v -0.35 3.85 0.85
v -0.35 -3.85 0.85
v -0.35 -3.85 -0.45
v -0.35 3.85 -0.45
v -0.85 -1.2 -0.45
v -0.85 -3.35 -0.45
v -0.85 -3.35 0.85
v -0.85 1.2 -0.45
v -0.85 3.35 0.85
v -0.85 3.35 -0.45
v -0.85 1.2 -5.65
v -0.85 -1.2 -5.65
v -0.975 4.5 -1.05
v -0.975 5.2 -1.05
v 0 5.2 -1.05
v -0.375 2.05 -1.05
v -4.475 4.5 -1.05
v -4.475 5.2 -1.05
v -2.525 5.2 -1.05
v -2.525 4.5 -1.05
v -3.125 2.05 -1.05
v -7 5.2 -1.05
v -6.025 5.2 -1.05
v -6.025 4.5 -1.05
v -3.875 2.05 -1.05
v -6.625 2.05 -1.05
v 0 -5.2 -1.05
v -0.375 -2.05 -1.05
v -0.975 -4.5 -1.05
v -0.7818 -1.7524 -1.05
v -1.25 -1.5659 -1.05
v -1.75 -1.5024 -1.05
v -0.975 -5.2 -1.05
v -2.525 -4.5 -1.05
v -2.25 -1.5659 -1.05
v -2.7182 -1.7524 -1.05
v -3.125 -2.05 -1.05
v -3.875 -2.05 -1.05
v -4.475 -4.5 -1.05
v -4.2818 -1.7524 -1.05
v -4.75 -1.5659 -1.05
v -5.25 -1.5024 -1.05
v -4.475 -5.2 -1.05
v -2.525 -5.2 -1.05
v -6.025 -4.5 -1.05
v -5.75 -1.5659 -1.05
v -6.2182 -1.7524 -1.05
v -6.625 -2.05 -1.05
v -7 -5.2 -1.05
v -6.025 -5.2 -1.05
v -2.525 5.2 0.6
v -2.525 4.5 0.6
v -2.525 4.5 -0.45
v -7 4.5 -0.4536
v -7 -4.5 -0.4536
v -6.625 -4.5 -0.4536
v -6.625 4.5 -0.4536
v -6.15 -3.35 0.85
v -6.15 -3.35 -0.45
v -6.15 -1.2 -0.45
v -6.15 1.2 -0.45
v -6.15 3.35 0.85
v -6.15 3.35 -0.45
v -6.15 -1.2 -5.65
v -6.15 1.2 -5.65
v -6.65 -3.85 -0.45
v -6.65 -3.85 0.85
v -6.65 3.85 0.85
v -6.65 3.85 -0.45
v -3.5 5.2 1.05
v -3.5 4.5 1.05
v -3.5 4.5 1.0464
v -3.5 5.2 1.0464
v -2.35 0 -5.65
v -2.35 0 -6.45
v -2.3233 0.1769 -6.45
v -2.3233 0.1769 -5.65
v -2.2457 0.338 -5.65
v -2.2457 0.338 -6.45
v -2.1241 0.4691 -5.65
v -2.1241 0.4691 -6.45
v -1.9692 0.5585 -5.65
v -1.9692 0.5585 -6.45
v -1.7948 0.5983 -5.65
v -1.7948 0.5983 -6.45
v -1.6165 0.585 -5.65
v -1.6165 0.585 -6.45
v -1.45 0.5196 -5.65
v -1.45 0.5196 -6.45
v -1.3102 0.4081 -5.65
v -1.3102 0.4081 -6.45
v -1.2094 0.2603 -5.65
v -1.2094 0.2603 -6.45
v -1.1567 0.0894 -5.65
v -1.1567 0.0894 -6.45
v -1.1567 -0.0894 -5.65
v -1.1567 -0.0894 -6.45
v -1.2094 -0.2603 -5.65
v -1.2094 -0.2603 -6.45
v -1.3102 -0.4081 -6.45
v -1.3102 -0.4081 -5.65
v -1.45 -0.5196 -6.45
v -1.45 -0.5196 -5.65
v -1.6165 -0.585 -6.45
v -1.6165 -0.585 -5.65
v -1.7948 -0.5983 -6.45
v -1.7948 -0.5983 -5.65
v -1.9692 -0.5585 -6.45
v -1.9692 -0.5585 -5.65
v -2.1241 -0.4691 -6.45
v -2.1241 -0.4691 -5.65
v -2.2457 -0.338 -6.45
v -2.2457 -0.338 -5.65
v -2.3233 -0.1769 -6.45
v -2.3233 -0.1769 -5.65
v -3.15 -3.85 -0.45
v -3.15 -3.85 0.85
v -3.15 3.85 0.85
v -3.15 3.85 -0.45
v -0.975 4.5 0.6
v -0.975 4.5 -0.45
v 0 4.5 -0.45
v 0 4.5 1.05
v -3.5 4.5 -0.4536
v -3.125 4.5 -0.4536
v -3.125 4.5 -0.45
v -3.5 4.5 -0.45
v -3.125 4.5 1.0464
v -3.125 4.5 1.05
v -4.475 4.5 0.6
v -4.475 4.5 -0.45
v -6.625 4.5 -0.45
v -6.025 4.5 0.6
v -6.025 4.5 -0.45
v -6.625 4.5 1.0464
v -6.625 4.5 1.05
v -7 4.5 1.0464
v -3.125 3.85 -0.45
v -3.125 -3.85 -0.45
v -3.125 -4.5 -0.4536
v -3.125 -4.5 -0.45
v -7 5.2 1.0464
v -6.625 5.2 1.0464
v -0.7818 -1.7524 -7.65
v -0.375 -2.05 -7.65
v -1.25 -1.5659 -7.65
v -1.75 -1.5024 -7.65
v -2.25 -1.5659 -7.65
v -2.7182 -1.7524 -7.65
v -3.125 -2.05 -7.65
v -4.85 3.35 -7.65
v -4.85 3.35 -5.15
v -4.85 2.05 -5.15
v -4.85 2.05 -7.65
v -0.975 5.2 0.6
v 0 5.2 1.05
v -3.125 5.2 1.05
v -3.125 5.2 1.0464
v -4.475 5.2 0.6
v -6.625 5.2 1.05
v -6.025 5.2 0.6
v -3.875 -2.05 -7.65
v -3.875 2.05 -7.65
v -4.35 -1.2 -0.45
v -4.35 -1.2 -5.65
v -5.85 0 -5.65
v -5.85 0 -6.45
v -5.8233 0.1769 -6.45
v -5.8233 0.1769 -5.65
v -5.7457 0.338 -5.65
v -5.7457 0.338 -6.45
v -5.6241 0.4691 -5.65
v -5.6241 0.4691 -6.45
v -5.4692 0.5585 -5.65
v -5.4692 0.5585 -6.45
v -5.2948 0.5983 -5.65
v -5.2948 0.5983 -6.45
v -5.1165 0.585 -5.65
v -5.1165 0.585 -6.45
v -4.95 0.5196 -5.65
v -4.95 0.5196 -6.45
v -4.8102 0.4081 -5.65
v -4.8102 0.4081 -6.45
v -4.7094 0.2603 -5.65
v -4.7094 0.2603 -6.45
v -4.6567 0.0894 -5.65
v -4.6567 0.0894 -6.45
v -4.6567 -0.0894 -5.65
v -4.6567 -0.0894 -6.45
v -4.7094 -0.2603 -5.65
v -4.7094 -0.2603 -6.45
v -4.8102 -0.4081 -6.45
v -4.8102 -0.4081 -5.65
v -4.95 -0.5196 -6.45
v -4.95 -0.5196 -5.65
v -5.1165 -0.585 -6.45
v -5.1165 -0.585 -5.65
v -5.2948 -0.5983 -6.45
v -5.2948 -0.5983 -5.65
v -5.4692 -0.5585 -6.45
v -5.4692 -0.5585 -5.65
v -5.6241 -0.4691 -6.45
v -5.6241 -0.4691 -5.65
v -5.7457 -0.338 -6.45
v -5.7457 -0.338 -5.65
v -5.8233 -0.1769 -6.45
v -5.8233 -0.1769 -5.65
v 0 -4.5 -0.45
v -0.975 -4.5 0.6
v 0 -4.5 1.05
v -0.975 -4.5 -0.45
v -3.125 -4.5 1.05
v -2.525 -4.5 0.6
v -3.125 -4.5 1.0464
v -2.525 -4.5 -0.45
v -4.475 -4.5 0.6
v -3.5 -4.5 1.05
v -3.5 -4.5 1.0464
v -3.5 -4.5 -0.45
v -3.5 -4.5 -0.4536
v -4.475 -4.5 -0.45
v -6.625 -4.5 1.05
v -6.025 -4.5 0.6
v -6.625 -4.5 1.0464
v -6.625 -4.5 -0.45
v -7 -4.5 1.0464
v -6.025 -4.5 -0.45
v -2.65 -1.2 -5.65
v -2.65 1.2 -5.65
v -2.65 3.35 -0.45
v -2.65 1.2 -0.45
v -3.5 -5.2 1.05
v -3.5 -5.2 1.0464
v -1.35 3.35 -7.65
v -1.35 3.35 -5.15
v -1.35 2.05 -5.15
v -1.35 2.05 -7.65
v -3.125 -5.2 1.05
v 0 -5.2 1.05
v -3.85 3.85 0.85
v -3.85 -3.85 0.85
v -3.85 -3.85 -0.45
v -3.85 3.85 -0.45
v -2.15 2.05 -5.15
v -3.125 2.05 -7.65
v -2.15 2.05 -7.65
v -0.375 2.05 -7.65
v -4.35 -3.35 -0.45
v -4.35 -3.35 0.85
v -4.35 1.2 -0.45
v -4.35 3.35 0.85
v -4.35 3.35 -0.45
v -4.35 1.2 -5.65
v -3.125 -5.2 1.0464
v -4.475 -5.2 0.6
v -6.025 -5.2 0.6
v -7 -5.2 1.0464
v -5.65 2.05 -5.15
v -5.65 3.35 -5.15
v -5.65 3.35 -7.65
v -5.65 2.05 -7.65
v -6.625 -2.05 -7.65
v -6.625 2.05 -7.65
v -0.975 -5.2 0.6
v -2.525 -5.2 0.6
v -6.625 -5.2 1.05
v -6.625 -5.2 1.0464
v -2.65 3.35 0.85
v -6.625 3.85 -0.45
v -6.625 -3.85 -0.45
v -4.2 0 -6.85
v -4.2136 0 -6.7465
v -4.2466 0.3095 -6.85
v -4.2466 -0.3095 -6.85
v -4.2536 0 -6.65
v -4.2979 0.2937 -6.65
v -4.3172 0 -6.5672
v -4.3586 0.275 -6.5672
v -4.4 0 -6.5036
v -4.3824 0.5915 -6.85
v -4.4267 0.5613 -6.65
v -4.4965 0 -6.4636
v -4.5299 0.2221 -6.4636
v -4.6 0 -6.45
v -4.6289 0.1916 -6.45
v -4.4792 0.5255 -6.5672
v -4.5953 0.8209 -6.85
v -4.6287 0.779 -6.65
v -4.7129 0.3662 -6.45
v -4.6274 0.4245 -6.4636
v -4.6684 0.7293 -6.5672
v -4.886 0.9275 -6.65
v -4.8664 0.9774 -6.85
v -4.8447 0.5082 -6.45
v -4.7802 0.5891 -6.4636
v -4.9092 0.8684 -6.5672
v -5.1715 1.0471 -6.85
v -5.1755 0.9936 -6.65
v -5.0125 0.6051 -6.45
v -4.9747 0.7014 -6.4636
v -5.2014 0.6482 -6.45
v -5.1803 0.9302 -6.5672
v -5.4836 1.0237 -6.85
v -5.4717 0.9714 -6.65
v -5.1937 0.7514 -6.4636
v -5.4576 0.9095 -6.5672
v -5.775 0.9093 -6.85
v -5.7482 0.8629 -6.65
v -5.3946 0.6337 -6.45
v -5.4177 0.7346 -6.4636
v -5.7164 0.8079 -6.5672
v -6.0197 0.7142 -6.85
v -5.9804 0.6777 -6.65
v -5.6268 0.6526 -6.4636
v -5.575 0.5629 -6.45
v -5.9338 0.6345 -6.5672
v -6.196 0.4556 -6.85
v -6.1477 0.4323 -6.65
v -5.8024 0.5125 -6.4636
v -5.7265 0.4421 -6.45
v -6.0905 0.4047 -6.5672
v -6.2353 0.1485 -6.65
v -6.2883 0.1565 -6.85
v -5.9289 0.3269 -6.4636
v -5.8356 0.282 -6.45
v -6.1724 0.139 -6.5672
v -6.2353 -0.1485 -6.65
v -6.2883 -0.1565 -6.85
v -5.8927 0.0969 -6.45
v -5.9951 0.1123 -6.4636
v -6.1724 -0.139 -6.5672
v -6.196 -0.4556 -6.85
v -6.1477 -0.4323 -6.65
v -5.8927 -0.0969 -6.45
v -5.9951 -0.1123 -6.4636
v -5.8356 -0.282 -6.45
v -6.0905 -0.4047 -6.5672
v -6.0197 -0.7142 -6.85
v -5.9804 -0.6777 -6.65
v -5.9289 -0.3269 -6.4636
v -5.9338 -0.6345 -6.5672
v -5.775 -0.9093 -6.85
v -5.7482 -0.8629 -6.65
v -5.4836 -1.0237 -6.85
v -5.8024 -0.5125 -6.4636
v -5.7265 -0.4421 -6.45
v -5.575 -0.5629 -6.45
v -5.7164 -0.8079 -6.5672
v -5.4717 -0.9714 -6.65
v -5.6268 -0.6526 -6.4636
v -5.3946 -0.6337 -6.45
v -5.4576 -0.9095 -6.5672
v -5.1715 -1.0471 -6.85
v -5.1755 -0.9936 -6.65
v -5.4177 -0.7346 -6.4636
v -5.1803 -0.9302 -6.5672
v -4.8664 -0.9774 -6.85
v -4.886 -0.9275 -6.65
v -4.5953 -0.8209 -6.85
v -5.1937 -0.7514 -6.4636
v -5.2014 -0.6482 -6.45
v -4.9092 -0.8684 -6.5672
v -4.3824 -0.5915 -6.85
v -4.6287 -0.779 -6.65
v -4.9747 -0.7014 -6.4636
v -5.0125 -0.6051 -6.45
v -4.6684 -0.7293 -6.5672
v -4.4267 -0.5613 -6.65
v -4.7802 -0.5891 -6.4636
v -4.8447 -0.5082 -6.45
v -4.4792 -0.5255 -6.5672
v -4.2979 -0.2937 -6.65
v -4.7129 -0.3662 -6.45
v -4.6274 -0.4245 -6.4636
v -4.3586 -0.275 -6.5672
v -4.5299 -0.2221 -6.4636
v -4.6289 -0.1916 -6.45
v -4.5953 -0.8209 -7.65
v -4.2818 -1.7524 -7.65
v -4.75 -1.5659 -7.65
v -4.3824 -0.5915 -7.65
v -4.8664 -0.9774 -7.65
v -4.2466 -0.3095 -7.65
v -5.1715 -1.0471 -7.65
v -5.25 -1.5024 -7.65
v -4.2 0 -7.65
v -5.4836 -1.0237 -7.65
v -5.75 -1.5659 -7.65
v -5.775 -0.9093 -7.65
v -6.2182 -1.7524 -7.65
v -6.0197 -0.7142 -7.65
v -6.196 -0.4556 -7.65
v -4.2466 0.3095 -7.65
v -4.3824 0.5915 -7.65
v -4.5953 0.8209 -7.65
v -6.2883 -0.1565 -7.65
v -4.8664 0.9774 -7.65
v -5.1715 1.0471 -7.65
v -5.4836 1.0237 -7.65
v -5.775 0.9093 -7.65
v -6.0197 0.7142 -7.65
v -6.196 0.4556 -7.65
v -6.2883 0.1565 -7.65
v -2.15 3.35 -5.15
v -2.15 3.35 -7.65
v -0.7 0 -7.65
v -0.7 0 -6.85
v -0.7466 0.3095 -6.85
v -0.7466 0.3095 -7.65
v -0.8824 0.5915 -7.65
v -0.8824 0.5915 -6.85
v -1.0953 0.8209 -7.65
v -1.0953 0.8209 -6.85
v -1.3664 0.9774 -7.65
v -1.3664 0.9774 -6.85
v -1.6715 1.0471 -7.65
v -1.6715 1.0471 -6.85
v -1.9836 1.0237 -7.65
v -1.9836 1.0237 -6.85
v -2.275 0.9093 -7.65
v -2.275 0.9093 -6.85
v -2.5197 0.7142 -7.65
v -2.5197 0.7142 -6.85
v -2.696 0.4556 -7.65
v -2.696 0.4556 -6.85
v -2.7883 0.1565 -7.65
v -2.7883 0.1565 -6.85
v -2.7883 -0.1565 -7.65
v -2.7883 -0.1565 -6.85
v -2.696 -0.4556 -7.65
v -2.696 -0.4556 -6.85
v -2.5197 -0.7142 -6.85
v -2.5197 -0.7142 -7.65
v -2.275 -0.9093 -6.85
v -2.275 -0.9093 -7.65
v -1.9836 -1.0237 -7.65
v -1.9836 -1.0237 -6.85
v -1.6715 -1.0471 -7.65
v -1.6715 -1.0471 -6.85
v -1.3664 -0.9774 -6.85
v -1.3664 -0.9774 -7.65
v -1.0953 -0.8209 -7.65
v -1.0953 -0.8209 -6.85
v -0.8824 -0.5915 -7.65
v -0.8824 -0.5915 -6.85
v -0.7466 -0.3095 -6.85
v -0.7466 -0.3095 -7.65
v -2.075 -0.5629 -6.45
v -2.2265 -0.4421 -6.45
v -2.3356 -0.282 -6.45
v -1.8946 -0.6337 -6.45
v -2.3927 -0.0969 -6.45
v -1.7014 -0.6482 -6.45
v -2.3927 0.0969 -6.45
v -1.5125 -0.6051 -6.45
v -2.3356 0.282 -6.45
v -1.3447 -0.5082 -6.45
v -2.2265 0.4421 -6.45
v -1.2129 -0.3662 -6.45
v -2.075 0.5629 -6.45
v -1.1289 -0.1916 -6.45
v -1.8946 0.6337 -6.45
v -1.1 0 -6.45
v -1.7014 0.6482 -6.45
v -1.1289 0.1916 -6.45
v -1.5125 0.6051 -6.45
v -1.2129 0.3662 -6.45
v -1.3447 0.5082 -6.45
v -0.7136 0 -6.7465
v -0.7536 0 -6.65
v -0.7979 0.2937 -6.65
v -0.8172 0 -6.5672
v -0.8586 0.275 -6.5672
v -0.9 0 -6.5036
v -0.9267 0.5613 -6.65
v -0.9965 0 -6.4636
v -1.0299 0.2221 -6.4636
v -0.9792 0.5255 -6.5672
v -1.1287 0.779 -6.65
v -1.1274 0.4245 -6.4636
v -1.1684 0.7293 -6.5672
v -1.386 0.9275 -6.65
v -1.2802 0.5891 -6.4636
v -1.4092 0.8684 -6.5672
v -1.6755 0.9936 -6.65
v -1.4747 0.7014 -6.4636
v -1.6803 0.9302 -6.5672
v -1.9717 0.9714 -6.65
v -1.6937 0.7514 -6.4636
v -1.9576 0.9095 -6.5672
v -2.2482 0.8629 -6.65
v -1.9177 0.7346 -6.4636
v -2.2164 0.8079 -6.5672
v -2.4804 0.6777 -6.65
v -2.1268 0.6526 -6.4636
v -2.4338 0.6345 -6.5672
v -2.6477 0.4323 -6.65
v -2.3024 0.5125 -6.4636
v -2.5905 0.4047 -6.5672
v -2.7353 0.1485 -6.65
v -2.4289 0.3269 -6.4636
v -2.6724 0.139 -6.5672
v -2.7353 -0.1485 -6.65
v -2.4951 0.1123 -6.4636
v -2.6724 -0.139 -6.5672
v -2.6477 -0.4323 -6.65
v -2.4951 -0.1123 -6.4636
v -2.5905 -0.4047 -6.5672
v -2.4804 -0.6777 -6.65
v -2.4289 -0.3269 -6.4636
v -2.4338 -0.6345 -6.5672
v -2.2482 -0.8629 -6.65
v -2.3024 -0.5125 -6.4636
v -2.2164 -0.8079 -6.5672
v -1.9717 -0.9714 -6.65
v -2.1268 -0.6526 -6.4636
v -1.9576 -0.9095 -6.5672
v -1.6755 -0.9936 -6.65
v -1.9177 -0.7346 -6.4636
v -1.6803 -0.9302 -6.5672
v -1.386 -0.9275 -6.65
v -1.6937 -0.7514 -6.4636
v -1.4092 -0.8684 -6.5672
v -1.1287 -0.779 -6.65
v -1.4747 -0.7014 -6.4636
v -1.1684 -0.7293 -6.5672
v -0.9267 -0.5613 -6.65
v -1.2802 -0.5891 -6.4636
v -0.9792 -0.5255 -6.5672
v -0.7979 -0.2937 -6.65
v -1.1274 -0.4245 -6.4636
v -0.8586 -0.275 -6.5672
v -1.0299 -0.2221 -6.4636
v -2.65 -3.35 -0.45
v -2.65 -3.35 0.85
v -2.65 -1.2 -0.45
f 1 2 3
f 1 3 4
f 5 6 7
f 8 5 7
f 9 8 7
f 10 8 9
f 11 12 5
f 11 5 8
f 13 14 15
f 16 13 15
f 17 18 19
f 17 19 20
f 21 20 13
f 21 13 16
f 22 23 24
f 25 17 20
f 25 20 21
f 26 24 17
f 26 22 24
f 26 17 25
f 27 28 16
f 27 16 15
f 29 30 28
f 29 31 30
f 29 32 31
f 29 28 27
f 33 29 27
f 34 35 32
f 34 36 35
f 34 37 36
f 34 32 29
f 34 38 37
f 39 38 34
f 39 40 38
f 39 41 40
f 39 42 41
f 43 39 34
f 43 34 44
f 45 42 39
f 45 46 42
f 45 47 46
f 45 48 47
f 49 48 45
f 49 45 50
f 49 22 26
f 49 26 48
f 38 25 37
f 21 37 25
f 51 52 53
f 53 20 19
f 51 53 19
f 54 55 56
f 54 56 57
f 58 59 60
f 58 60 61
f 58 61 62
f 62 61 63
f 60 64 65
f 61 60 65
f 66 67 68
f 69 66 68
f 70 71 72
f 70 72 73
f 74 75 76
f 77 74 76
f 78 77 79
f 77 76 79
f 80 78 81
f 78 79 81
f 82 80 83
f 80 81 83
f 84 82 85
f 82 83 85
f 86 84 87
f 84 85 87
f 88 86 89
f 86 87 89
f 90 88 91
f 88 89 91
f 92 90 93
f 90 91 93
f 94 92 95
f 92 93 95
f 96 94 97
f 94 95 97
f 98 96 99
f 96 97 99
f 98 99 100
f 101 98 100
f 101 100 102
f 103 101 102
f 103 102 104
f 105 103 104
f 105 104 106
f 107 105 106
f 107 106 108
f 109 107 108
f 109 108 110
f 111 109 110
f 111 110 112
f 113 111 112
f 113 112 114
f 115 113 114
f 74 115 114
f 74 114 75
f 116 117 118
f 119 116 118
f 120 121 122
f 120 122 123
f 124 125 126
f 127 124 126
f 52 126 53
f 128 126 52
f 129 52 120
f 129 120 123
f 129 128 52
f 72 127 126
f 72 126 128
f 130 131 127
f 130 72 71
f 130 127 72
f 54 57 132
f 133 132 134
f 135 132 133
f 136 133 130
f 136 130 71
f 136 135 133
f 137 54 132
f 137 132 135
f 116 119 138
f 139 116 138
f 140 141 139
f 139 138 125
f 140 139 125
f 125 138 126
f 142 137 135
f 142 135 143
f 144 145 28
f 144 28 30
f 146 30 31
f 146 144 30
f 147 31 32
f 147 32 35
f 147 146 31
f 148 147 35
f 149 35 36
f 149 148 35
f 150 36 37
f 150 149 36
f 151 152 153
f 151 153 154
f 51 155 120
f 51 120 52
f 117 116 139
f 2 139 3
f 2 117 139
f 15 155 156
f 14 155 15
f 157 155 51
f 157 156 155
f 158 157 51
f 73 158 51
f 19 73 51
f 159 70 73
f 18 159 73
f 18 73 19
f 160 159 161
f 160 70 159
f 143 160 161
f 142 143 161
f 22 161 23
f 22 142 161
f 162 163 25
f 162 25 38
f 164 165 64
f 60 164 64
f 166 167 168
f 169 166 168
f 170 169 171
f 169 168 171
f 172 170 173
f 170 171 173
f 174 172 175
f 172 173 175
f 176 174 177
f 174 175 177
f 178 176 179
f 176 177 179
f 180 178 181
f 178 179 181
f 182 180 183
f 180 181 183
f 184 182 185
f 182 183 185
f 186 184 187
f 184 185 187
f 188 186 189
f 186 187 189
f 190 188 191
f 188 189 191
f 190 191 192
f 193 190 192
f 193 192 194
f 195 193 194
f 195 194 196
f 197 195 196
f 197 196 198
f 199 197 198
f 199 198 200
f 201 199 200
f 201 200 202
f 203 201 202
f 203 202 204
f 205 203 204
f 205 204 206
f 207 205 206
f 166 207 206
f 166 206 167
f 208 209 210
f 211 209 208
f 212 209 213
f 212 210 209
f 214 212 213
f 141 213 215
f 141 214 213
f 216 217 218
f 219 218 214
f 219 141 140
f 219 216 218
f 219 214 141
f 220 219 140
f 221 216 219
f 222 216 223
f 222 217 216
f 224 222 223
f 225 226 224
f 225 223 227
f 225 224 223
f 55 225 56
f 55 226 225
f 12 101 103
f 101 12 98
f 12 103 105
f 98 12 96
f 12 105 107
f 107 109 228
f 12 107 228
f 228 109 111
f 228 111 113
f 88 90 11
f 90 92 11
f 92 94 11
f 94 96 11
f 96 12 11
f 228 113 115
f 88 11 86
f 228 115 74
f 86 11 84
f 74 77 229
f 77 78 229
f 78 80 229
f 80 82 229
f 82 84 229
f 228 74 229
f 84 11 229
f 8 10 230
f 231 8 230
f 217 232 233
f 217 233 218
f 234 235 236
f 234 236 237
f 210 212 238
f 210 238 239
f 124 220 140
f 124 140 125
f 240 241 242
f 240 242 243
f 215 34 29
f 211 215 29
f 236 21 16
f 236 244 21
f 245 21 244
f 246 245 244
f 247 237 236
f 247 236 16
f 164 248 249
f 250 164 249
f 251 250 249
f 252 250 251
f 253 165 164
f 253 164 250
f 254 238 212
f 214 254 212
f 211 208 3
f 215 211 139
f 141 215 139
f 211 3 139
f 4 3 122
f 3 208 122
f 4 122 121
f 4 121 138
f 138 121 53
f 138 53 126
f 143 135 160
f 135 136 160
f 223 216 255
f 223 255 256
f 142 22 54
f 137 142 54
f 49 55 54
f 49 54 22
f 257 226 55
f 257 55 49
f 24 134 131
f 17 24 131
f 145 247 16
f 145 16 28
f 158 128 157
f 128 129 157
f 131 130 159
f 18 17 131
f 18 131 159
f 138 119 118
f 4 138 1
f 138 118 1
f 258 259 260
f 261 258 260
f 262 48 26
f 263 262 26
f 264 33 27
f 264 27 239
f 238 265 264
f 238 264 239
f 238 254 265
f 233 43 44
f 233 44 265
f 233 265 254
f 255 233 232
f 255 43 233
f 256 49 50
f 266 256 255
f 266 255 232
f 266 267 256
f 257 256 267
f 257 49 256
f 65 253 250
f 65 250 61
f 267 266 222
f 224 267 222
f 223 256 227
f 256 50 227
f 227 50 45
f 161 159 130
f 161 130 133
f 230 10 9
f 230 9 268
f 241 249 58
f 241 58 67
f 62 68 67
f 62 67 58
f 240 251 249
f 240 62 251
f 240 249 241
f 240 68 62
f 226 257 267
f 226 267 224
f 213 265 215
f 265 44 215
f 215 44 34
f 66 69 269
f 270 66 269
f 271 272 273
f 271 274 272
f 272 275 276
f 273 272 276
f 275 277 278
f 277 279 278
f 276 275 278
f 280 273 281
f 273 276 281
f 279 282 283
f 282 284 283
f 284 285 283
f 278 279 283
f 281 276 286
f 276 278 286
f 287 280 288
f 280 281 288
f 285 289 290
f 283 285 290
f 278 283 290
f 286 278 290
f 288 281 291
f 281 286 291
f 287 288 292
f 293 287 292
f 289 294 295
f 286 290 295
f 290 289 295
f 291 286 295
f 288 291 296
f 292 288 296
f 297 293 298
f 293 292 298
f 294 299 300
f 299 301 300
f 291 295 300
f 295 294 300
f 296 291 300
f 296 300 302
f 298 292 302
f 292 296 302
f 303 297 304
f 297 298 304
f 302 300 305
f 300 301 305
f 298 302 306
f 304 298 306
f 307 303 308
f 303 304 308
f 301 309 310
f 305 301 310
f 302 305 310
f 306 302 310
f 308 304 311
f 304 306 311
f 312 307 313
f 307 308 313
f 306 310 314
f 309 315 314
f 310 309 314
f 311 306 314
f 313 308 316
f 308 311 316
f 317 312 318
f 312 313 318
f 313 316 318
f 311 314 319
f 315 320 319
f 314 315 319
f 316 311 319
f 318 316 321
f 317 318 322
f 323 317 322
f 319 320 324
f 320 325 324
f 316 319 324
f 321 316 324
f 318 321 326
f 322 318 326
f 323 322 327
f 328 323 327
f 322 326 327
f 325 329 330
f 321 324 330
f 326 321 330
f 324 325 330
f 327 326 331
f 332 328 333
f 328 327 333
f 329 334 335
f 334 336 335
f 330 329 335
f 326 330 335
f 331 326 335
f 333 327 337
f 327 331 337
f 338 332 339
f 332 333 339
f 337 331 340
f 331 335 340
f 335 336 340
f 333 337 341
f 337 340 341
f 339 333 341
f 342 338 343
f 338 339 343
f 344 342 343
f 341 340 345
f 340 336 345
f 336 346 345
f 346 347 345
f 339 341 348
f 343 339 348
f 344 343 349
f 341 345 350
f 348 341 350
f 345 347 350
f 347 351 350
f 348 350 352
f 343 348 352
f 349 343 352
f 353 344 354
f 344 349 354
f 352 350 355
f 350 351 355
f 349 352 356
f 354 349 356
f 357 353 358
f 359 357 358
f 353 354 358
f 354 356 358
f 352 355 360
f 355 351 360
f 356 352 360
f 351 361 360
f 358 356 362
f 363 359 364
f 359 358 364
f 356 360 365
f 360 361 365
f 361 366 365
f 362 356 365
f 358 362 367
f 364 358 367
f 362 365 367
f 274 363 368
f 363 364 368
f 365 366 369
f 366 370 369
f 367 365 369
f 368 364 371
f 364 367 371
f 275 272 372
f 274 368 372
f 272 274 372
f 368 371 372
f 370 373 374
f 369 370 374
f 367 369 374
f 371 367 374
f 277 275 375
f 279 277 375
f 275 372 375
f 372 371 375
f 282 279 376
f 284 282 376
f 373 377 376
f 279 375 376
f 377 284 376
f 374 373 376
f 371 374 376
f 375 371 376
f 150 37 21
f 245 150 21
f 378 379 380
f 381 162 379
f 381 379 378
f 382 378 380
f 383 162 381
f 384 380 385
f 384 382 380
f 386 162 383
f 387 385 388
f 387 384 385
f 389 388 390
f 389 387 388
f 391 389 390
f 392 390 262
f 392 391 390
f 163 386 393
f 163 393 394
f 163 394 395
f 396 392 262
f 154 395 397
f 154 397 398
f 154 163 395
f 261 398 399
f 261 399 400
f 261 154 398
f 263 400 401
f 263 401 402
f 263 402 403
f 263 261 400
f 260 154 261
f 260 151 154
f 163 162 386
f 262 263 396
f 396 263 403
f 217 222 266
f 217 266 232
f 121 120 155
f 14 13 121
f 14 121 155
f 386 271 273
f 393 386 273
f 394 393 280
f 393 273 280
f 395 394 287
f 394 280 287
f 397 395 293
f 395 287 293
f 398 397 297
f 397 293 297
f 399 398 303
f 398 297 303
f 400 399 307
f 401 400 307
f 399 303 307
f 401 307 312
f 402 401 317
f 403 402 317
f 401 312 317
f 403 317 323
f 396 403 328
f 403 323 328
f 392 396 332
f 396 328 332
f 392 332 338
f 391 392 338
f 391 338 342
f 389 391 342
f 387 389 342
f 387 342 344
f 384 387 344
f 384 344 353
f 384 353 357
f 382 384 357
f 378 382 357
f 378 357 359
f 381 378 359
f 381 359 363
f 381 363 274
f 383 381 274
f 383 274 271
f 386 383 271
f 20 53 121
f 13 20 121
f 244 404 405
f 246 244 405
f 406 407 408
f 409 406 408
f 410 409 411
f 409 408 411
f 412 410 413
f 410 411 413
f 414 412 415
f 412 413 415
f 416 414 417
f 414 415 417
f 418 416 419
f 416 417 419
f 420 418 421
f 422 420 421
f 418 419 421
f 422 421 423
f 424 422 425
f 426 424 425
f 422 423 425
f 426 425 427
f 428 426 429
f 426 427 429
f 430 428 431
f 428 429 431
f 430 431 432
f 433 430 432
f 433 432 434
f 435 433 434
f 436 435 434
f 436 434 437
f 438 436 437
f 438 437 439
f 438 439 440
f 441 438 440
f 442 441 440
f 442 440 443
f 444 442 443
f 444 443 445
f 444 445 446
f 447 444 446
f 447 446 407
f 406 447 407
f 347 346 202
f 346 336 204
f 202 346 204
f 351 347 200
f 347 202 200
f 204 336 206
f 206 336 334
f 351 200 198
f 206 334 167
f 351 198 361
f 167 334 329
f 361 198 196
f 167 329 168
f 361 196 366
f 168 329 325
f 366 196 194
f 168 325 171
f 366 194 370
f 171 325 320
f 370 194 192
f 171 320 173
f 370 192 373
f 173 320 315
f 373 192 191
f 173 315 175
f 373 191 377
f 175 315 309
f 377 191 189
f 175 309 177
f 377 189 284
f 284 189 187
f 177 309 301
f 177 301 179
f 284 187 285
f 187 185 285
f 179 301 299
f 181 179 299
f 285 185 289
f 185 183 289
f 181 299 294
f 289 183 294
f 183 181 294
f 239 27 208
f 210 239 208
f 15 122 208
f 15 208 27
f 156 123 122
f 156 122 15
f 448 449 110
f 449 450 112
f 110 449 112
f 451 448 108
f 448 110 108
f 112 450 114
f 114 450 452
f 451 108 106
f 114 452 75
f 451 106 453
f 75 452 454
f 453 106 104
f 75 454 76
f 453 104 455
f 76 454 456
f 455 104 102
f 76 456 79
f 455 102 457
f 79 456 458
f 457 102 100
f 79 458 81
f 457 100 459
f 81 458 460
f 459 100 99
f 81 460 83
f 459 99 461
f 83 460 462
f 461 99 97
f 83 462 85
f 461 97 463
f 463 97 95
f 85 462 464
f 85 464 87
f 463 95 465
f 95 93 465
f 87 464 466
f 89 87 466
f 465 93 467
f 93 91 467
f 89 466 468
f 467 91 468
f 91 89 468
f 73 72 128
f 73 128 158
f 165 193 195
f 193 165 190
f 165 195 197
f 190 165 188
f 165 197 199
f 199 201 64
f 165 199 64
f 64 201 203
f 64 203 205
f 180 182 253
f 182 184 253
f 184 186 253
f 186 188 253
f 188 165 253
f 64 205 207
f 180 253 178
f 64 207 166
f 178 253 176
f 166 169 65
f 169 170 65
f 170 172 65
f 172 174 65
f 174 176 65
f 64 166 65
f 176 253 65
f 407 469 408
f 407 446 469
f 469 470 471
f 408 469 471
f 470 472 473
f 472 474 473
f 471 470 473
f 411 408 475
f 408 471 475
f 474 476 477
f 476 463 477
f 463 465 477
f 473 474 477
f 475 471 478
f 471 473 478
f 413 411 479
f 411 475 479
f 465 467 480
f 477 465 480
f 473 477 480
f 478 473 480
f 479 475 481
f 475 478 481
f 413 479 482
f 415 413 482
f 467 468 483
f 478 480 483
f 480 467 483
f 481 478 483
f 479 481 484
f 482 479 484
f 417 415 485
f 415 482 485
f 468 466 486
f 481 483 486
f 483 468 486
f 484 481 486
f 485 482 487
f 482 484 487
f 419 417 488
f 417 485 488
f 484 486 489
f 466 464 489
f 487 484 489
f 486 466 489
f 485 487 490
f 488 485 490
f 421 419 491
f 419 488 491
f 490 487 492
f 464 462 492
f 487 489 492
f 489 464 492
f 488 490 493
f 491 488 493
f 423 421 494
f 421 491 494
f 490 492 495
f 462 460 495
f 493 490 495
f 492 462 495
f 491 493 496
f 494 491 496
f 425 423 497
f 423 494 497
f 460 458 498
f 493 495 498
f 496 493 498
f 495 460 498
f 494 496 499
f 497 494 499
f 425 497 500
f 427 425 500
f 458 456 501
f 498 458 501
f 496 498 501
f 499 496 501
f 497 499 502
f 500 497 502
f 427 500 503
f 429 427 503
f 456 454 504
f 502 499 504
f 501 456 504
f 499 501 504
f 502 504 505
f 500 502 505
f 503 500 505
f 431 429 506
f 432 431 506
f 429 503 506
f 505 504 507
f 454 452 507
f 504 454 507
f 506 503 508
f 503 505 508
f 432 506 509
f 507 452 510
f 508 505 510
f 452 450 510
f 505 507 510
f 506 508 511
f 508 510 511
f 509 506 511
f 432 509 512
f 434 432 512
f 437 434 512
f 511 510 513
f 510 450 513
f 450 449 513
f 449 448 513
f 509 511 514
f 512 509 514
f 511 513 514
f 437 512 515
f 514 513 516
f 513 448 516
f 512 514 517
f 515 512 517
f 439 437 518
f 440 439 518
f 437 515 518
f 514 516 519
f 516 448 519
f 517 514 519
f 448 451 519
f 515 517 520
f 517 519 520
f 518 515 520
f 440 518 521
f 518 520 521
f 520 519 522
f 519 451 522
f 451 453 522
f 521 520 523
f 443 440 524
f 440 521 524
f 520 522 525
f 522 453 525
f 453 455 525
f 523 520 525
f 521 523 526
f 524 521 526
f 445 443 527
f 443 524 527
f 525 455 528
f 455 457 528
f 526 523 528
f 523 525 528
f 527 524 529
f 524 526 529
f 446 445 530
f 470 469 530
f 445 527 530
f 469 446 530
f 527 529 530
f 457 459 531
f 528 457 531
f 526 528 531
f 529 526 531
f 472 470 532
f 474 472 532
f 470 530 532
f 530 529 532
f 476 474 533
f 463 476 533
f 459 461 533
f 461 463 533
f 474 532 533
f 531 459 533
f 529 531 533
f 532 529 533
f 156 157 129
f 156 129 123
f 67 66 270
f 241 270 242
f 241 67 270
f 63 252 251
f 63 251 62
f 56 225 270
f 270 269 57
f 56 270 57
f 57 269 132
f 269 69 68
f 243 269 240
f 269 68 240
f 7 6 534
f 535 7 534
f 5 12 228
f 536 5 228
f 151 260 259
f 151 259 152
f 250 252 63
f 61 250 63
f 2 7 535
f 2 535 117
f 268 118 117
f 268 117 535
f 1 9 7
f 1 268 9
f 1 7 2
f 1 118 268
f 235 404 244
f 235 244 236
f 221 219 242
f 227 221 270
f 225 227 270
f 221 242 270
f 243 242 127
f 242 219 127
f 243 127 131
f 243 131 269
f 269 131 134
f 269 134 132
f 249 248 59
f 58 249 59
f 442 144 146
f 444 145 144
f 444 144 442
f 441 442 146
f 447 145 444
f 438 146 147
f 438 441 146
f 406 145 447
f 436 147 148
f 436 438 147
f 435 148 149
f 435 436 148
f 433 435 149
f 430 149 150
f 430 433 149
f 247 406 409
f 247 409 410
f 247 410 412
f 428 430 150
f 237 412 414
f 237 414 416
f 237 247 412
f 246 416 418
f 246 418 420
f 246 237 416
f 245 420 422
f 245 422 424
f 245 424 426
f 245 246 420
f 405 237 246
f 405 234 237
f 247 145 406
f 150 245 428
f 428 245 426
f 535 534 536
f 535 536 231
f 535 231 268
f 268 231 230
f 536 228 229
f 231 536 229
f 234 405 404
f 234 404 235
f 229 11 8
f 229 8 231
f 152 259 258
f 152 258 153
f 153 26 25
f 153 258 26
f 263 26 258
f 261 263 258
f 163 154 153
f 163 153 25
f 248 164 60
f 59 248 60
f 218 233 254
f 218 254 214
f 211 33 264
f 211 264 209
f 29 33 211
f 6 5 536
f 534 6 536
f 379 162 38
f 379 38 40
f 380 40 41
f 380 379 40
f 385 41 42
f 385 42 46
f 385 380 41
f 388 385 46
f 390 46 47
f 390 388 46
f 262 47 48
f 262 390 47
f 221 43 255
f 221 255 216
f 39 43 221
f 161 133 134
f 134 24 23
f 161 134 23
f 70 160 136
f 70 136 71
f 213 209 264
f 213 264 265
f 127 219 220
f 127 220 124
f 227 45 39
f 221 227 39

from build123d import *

# Parameters (mm, degrees)
SKETCH_1_W                     = 3.125
SKETCH_1_H                     = 10.4
EXTRUDE_1_DEPTH                = 2.1
CUT_EXTRUDE_1_REACH            = 8.249
SKETCH_2_W                     = 6.25
SKETCH_2_H                     = 9
SKETCH_3_W                     = 1.55
SKETCH_3_H                     = 0.7
CUT_EXTRUDE_2_DEPTH            = 1.05
SKETCH_5_W                     = 1.55
SKETCH_5_H                     = 0.7
CUT_EXTRUDE_4_DEPTH            = 1.05
EXTRUDE_3_DEPTH                = 6.6
SKETCH_9_W                     = 2.8
SKETCH_9_H                     = 7.7
EXTRUDE_4_DEPTH                = 1.3
CUT_EXTRUDE_6_REACH            = 11.424
SKETCH_11_W                    = 1.8
SKETCH_11_H                    = 6.7
CUT_EXTRUDE_9_REACH            = 11.047
SKETCH_14_W                    = 1.8
SKETCH_14_H                    = 2.4
CUT_EXTRUDE_11_REACH           = 14.749
SKETCH_16_W                    = 1.55
SKETCH_16_H                    = 0.6
CUT_EXTRUDE_12_REACH           = 14.749
SKETCH_17_W                    = 1.55
SKETCH_17_H                    = 0.6
EXTRUDE_6_DEPTH                = 0.375
SKETCH_21_W                    = 0.8
SKETCH_21_H                    = 2.5
EXTRUDE_8_DEPTH                = 1.3
HOLE_WIZARD_2_1_2_1_2_D        = 2.1
HOLE_WIZARD_2_1_2_1_2_DEPTH    = 1.2
HOLE_WIZARD_1_2_1_2_1_D        = 1.2
FILLET_1_R                     = 0.4
PATTERN_LINEAR_1_COUNT         = 2
PATTERN_LINEAR_1_PITCH         = 3.5
FILLET_1_OF_PATTERN_LINEAR_1_R = 0.4


with BuildPart() as part:
    # Эскиз1 → Бобышка-Вытянуть1 (new body)
    with BuildSketch(Plane.XY.offset(1.05)):
        with Locations((-1.5625, 0)):
            Rectangle(SKETCH_1_W, SKETCH_1_H)
    extrude_1 = extrude(amount=-EXTRUDE_1_DEPTH)

    # Эскиз2 → Вырез-Вытянуть1 (cut, up to next)
    with BuildSketch(Plane(origin=(0, 0, -0.45), x_dir=(-1, 0, 0), z_dir=(0, 0, -1)), mode=Mode.PRIVATE) as cut_extrude_1_sk1:
        Rectangle(SKETCH_2_W, SKETCH_2_H)
    cut_extrude_1_tool1 = extrude(cut_extrude_1_sk1.sketch, amount=-CUT_EXTRUDE_1_REACH, mode=Mode.PRIVATE) & part.part
    cut_extrude_1 = cut_extrude_1_tool1.solids().sort_by_distance((0, 0, -0.45))[0]
    add(cut_extrude_1, mode=Mode.SUBTRACT)

    # Эскиз3 → Вырез-Вытянуть2 (cut)
    with BuildSketch(Plane(origin=(0, 0, -0.45), x_dir=(-1, 0, 0), z_dir=(0, 0, -1))):
        with Locations((1.75, 4.85)):
            Rectangle(SKETCH_3_W, SKETCH_3_H)
    cut_extrude_2 = extrude(amount=-CUT_EXTRUDE_2_DEPTH, mode=Mode.SUBTRACT)

    # Эскиз5 → Вырез-Вытянуть4 (cut)
    with BuildSketch(Plane(origin=(0, 0, -0.45), x_dir=(-1, 0, 0), z_dir=(0, 0, -1))):
        with Locations((1.75, -4.85)):
            Rectangle(SKETCH_5_W, SKETCH_5_H)
    cut_extrude_4 = extrude(amount=-CUT_EXTRUDE_4_DEPTH, mode=Mode.SUBTRACT)

    # Эскиз8 → Бобышка-Вытянуть3 (add)
    with BuildSketch(Plane(origin=(0, 0, -7.65), x_dir=(-1, 0, 0), z_dir=(0, 0, -1))):
        with BuildLine():
            Line((3.125, 2.05), (0.375, 2.05))
            Line((0.375, 2.05), (0.375, -2.05))
            ThreePointArc((0.375, -2.05), (1.75, -1.502368755), (3.125, -2.05))
            Line((3.125, -2.05), (3.125, 2.05))
        make_face()
    extrude_3 = extrude(amount=-EXTRUDE_3_DEPTH)

    # Эскиз9 → Бобышка-Вытянуть4 (add)
    with BuildSketch(Plane.XY.offset(0.85)):
        with Locations((-1.75, 0)):
            Rectangle(SKETCH_9_W, SKETCH_9_H)
    extrude_4 = extrude(amount=-EXTRUDE_4_DEPTH)

    # Эскиз11 → Вырез-Вытянуть6 (cut, up to next)
    with BuildSketch(Plane(origin=(0, 0, -0.45), x_dir=(-1, 0, 0), z_dir=(0, 0, -1)), mode=Mode.PRIVATE) as cut_extrude_6_sk1:
        with Locations((1.75, 0)):
            Rectangle(SKETCH_11_W, SKETCH_11_H)
    cut_extrude_6_tool1 = extrude(cut_extrude_6_sk1.sketch, amount=-CUT_EXTRUDE_6_REACH, mode=Mode.PRIVATE) & part.part
    cut_extrude_6 = cut_extrude_6_tool1.solids().sort_by_distance((-1.75, 0, -0.45))[0]
    add(cut_extrude_6, mode=Mode.SUBTRACT)

    # Эскиз14 → Вырез-Вытянуть9 (cut, up to next)
    with BuildSketch(Plane(origin=(0, 0, -5.65), x_dir=(-1, 0, 0), z_dir=(0, 0, -1)), mode=Mode.PRIVATE) as cut_extrude_9_sk1:
        with Locations((1.75, 0)):
            Rectangle(SKETCH_14_W, SKETCH_14_H)
    cut_extrude_9_tool1 = extrude(cut_extrude_9_sk1.sketch, amount=-CUT_EXTRUDE_9_REACH, mode=Mode.PRIVATE) & part.part
    cut_extrude_9 = cut_extrude_9_tool1.solids().sort_by_distance((-1.75, 0, -5.65))[0]
    add(cut_extrude_9, mode=Mode.SUBTRACT)

    # Эскиз16 → Вырез-Вытянуть11 (cut, up to next)
    with BuildSketch(Plane(origin=(0, -4.5, 0), x_dir=(1, 0, 0), z_dir=(0, 1, 0)), mode=Mode.PRIVATE) as cut_extrude_11_sk1:
        with Locations((-1.75, 0.75)):
            Rectangle(SKETCH_16_W, SKETCH_16_H)
    cut_extrude_11_tool1 = extrude(cut_extrude_11_sk1.sketch, amount=-CUT_EXTRUDE_11_REACH, mode=Mode.PRIVATE) & part.part
    cut_extrude_11 = cut_extrude_11_tool1.solids().sort_by_distance((-1.75, -4.5, -0.75))[0]
    add(cut_extrude_11, mode=Mode.SUBTRACT)

    # Эскиз17 → Вырез-Вытянуть12 (cut, up to next)
    with BuildSketch(Plane.XZ.offset(-4.5), mode=Mode.PRIVATE) as cut_extrude_12_sk1:
        with Locations((-1.75, -0.75)):
            Rectangle(SKETCH_17_W, SKETCH_17_H)
    cut_extrude_12_tool1 = extrude(cut_extrude_12_sk1.sketch, amount=-CUT_EXTRUDE_12_REACH, mode=Mode.PRIVATE) & part.part
    cut_extrude_12 = cut_extrude_12_tool1.solids().sort_by_distance((-1.75, 4.5, -0.75))[0]
    add(cut_extrude_12, mode=Mode.SUBTRACT)

    # Эскиз19 → Бобышка-Вытянуть6 (add)
    with BuildSketch(Plane(origin=(-3.5, 0, 0), x_dir=(0, -1, 0), z_dir=(-1, 0, 0))):
        Polygon((1.65, -1.05), (5.2, -1.05), (5.2, 1.046361901), (4.5, 1.046361901), (4.5, -0.453638099), (-4.5, -0.453638099), (-4.5, 1.046361901), (-5.2, 1.046361901), (-5.2, -1.05), align=None)
    extrude_6 = extrude(amount=-EXTRUDE_6_DEPTH)

    # Эскиз21 → Бобышка-Вытянуть8 (add)
    with BuildSketch(Plane(origin=(0, 3.35, 0), x_dir=(1, 0, 0), z_dir=(0, 1, 0))):
        with Locations((-1.75, 6.4)):
            Rectangle(SKETCH_21_W, SKETCH_21_H)
    extrude_8 = extrude(amount=-EXTRUDE_8_DEPTH)

    # Диаметр отверстия Ø2.1 (2.1)2
    with Locations(Plane(origin=(0, 0, -7.65), x_dir=(-1, 0, 0), z_dir=(0, 0, -1))):
        with Locations((1.75, 0)):
            hole_wizard_2_1_2_1_2 = Hole(HOLE_WIZARD_2_1_2_1_2_D / 2, depth=HOLE_WIZARD_2_1_2_1_2_DEPTH)

    # Диаметр отверстия Ø1.2 (1.2)1 (through all)
    with Locations(Plane.XY.offset(-5.65)):
        with Locations((-1.75, 0)):
            hole_wizard_1_2_1_2_1 = Hole(HOLE_WIZARD_1_2_1_2_1_D / 2)

    # Скругление1
    fillet_1_edges = [part.edges().sort_by_distance(p)[0] for p in [
        (-2.8, 0, -6.45),
    ]]
    fillet(fillet_1_edges, radius=FILLET_1_R)

    # Линейный массив1: Бобышка-Вытянуть1, Вырез-Вытянуть1, Вырез-Вытянуть2, Вырез-Вытянуть4, Бобышка-Вытянуть3, Бобышка-Вытянуть4, Вырез-Вытянуть6, Вырез-Вытянуть9, Вырез-Вытянуть11, Вырез-Вытянуть12, Бобышка-Вытянуть6, Бобышка-Вытянуть8, Диаметр отверстия Ø2.1 (2.1)2, Диаметр отверстия Ø1.2 (1.2)1 ×2
    with Locations(*[(-i * PATTERN_LINEAR_1_PITCH, 0, 0) for i in range(1, PATTERN_LINEAR_1_COUNT)]):
        add(extrude_1)
        add(cut_extrude_1, mode=Mode.SUBTRACT)
        add(cut_extrude_2, mode=Mode.SUBTRACT)
        add(cut_extrude_4, mode=Mode.SUBTRACT)
        add(extrude_3)
        add(extrude_4)
        add(cut_extrude_6, mode=Mode.SUBTRACT)
        add(cut_extrude_9, mode=Mode.SUBTRACT)
        add(cut_extrude_11, mode=Mode.SUBTRACT)
        add(cut_extrude_12, mode=Mode.SUBTRACT)
        add(extrude_6)
        add(extrude_8)
        add(hole_wizard_2_1_2_1_2, mode=Mode.SUBTRACT)
        add(hole_wizard_1_2_1_2_1, mode=Mode.SUBTRACT)

    # Скругление1 of Линейный массив1
    fillet_1_of_pattern_linear_1_edges = [part.edges().sort_by_distance(p)[0] for p in [
        (-6.3, 0, -6.45),
    ]]
    fillet(fillet_1_of_pattern_linear_1_edges, radius=FILLET_1_OF_PATTERN_LINEAR_1_R)


solid = part.part
